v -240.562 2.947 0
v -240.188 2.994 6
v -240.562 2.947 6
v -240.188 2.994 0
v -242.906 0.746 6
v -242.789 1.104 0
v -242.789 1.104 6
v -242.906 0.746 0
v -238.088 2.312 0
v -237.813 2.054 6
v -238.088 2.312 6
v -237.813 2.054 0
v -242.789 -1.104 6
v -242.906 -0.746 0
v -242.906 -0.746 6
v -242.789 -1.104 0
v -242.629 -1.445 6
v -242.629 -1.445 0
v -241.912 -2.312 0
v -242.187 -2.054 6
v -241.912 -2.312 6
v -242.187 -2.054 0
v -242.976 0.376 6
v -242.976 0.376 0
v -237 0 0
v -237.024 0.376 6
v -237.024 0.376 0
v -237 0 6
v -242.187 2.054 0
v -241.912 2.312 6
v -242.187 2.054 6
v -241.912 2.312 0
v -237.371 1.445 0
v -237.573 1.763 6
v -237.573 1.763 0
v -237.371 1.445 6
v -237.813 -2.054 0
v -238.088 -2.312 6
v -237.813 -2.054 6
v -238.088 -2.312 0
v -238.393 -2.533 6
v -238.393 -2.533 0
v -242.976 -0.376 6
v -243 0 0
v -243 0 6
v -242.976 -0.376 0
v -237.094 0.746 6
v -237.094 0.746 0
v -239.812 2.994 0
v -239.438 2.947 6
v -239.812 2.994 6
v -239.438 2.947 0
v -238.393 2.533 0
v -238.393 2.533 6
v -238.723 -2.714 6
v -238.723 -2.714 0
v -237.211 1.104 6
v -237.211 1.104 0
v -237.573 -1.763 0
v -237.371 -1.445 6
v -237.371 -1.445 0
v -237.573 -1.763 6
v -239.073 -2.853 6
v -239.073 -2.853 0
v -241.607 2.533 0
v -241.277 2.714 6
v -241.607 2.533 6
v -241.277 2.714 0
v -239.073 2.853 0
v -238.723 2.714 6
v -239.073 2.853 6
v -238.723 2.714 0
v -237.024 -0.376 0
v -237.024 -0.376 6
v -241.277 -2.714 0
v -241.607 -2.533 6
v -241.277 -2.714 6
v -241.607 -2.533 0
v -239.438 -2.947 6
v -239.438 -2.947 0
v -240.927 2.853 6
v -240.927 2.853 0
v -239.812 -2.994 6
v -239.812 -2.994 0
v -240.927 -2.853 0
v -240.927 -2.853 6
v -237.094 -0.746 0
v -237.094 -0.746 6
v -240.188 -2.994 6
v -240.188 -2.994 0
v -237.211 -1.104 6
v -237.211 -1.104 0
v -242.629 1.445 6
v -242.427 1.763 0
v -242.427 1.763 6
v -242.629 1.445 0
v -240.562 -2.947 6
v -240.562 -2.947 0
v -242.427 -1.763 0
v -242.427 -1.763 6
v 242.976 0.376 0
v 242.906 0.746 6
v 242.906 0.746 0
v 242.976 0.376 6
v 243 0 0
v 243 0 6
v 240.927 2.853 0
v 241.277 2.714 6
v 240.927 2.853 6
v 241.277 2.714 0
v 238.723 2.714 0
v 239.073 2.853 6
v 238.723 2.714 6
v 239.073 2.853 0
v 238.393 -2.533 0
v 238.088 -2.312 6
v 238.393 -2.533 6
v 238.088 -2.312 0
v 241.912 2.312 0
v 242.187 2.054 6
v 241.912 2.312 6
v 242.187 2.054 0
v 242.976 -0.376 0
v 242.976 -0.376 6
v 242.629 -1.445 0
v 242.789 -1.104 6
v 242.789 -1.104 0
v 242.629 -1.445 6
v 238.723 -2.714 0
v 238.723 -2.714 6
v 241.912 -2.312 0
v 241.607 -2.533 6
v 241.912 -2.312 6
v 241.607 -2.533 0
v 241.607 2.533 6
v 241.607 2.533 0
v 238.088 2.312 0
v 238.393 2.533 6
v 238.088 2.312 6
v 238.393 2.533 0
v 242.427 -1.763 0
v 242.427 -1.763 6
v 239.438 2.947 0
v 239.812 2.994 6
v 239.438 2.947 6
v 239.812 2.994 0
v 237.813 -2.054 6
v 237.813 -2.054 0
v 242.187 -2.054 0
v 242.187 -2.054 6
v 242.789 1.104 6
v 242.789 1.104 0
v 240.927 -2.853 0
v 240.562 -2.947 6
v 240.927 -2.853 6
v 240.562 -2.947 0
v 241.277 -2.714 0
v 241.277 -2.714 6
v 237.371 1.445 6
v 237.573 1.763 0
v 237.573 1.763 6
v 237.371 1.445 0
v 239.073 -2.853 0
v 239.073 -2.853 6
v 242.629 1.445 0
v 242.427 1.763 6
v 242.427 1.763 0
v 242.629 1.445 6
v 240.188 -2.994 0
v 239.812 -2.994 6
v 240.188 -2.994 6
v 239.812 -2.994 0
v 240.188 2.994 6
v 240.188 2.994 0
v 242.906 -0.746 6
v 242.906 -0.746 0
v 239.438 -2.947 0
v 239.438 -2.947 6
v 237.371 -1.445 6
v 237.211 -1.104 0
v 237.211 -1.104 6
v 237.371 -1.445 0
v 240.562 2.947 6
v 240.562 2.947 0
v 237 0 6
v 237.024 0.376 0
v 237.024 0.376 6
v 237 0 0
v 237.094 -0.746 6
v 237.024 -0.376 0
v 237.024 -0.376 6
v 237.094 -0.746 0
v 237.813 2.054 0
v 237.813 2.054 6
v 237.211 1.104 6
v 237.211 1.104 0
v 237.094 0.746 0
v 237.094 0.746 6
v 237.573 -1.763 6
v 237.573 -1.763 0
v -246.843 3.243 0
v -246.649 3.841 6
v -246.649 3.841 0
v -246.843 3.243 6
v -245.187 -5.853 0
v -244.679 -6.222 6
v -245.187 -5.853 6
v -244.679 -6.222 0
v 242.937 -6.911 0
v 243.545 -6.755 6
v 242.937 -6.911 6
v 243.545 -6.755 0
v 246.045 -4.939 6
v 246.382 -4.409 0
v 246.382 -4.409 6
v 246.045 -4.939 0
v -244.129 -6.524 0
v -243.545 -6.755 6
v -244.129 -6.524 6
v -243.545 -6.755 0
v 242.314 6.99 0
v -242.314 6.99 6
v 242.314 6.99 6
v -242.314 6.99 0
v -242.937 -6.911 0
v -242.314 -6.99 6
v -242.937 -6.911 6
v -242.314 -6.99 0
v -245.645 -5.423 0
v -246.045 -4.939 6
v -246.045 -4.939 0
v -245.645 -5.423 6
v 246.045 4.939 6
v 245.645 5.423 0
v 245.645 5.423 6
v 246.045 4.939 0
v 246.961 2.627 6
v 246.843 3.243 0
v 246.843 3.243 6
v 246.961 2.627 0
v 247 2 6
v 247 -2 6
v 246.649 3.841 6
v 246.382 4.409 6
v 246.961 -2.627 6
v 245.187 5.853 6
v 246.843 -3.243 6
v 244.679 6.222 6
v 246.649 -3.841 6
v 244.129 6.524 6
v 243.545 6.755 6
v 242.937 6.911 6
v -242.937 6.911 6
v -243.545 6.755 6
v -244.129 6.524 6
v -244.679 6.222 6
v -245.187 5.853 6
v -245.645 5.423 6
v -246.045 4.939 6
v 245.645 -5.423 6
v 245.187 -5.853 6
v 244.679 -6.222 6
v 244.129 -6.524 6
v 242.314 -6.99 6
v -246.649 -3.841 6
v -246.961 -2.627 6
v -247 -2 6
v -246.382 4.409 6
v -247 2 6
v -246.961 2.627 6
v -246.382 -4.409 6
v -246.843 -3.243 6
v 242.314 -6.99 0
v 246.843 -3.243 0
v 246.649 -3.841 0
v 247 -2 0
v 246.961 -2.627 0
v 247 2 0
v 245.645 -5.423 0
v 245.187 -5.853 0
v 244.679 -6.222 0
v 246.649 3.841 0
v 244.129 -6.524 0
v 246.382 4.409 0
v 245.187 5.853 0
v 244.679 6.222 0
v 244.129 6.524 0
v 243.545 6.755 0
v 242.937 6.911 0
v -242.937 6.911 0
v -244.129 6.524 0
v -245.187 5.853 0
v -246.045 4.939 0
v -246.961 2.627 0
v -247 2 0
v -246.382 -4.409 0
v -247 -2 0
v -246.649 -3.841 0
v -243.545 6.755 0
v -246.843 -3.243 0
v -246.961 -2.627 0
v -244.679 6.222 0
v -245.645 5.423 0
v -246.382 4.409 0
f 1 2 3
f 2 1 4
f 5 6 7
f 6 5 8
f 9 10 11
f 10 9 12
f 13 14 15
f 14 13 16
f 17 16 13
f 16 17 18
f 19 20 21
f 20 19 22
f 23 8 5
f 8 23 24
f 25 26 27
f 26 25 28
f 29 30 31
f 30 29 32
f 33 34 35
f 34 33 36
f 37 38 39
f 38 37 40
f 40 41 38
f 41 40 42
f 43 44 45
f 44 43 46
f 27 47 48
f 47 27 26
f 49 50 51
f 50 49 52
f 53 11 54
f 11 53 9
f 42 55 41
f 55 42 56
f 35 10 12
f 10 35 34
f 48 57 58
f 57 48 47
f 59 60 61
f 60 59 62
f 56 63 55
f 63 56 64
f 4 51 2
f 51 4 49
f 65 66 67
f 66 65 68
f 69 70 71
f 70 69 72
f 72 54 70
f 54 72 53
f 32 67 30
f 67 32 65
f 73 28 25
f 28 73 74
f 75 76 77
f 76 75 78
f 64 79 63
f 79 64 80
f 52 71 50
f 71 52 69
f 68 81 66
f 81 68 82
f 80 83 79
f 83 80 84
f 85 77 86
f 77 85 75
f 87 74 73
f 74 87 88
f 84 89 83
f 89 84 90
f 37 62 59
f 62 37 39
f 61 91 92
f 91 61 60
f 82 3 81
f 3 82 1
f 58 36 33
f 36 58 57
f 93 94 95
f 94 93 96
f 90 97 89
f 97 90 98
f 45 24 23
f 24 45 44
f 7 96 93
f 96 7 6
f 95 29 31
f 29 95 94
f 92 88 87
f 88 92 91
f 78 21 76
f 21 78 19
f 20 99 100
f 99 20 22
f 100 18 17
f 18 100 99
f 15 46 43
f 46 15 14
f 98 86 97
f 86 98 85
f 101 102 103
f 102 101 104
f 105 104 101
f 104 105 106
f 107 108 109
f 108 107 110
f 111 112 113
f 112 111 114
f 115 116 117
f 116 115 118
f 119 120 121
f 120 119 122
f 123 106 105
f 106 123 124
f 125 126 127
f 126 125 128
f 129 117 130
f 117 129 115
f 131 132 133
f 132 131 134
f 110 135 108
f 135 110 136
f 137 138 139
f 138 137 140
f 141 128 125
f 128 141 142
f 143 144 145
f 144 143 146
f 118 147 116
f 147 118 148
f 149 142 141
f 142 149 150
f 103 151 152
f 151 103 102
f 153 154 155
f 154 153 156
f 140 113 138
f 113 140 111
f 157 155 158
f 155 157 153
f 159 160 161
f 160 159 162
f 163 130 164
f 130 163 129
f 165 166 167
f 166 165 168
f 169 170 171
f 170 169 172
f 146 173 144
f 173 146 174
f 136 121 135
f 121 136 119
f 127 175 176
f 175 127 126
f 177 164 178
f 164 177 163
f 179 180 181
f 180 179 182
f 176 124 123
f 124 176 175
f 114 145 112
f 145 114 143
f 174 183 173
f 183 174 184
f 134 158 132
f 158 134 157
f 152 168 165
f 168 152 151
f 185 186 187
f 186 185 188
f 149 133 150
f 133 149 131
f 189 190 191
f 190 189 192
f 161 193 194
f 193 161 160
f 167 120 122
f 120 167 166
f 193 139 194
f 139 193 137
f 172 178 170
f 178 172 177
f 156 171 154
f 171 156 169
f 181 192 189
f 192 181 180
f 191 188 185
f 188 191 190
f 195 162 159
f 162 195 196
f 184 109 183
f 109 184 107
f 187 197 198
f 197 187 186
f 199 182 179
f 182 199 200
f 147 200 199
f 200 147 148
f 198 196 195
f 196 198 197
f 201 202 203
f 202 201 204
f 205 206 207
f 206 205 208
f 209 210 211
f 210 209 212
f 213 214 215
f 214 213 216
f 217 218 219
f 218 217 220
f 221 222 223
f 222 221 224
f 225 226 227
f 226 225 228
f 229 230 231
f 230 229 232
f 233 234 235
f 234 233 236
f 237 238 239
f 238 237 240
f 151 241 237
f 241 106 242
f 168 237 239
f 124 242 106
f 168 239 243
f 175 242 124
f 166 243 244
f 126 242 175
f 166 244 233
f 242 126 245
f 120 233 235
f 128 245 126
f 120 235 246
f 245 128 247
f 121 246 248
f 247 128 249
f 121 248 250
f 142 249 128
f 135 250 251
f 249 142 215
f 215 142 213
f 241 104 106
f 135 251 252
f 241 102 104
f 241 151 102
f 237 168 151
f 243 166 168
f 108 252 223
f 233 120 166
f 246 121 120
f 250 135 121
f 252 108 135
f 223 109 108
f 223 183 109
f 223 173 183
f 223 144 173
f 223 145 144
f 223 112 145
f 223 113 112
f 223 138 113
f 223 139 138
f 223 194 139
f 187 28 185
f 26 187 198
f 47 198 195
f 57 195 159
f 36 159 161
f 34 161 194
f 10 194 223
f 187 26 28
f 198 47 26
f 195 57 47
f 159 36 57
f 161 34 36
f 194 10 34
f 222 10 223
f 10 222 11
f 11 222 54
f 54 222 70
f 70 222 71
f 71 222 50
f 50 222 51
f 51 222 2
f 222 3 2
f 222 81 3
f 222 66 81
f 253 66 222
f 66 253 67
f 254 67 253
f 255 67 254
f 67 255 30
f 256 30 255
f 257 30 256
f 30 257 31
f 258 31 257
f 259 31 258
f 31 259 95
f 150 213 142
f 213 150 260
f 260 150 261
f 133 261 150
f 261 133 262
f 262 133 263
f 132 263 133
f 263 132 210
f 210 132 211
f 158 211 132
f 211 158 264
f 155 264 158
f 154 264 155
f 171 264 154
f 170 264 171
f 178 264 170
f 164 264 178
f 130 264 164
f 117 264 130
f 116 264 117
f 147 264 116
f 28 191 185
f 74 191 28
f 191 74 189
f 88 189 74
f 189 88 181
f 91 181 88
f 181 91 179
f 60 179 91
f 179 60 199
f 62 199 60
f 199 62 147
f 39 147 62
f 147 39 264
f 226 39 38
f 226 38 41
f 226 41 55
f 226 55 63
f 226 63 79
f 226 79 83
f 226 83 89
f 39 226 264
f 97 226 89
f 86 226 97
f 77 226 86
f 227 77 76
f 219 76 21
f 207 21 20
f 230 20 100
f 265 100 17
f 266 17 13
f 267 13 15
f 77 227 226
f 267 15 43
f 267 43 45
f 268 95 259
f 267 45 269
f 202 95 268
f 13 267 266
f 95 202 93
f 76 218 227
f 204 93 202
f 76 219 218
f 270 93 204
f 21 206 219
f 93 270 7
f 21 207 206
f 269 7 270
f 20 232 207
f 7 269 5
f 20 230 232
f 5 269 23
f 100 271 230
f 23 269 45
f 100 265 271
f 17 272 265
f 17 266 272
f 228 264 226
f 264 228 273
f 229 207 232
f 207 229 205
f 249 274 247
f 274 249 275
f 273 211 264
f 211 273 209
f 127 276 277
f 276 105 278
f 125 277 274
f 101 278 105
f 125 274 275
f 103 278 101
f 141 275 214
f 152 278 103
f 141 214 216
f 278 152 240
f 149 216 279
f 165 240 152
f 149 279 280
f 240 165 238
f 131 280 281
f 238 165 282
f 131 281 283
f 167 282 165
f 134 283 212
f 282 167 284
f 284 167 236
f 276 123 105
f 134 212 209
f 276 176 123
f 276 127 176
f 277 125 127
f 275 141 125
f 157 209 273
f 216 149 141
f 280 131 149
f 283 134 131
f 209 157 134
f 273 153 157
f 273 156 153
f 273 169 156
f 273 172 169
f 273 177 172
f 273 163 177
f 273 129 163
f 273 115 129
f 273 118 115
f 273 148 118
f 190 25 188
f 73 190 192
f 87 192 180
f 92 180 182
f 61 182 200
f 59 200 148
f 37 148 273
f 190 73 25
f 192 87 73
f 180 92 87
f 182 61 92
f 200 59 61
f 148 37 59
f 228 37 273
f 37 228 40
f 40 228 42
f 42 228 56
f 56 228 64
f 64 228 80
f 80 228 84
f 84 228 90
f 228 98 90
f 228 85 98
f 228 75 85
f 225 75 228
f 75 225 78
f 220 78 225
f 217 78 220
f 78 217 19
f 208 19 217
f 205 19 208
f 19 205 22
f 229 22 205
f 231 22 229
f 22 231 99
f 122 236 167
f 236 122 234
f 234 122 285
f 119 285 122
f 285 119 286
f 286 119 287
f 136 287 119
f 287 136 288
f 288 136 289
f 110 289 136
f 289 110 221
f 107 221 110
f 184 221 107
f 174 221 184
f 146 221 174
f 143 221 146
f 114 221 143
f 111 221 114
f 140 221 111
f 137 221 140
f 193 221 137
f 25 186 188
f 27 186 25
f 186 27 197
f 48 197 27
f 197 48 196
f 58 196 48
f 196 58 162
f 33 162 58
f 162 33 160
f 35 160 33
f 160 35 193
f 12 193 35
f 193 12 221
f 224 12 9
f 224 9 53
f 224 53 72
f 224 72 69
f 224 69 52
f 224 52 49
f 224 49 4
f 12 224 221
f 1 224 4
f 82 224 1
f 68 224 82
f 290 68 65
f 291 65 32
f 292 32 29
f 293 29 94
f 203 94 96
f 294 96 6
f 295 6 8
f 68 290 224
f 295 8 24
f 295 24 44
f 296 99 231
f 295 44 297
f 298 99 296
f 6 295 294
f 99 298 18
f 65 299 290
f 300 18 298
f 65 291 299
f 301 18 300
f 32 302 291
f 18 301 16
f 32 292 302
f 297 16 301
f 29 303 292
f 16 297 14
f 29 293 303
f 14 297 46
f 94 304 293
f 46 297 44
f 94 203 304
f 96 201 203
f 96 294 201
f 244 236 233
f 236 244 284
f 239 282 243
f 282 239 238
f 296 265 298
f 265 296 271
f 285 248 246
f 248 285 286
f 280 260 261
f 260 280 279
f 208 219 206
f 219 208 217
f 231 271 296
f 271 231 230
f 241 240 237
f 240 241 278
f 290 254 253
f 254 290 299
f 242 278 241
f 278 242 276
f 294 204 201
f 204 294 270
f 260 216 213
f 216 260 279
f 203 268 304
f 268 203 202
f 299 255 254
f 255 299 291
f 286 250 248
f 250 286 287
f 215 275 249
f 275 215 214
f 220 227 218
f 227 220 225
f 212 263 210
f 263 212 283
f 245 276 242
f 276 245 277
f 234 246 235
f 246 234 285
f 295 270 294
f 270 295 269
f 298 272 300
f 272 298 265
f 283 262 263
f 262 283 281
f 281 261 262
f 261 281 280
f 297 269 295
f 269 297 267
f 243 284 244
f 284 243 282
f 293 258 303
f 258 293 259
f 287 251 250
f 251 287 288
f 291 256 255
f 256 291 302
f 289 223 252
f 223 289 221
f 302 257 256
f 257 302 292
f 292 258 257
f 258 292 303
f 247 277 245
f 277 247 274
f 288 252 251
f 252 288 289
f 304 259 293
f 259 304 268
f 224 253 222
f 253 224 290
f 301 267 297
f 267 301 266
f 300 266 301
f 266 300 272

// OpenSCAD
$fn = 50;


difference() {
	union() {
		hull() {
			translate(v = [-242.0000000000, 2.0000000000, 0]) {
				cylinder(h = 6, r = 5);
			}
			translate(v = [242.0000000000, 2.0000000000, 0]) {
				cylinder(h = 6, r = 5);
			}
			translate(v = [-242.0000000000, -2.0000000000, 0]) {
				cylinder(h = 6, r = 5);
			}
			translate(v = [242.0000000000, -2.0000000000, 0]) {
				cylinder(h = 6, r = 5);
			}
		}
	}
	union() {
		translate(v = [-240.0000000000, 0.0000000000, -100.0000000000]) {
			cylinder(h = 200, r = 3.0000000000);
		}
		translate(v = [-240.0000000000, 0.0000000000, -100.0000000000]) {
			cylinder(h = 200, r = 3.0000000000);
		}
		translate(v = [240.0000000000, 0.0000000000, -100.0000000000]) {
			cylinder(h = 200, r = 3.0000000000);
		}
		translate(v = [240.0000000000, 0.0000000000, -100.0000000000]) {
			cylinder(h = 200, r = 3.0000000000);
		}
	}
}
